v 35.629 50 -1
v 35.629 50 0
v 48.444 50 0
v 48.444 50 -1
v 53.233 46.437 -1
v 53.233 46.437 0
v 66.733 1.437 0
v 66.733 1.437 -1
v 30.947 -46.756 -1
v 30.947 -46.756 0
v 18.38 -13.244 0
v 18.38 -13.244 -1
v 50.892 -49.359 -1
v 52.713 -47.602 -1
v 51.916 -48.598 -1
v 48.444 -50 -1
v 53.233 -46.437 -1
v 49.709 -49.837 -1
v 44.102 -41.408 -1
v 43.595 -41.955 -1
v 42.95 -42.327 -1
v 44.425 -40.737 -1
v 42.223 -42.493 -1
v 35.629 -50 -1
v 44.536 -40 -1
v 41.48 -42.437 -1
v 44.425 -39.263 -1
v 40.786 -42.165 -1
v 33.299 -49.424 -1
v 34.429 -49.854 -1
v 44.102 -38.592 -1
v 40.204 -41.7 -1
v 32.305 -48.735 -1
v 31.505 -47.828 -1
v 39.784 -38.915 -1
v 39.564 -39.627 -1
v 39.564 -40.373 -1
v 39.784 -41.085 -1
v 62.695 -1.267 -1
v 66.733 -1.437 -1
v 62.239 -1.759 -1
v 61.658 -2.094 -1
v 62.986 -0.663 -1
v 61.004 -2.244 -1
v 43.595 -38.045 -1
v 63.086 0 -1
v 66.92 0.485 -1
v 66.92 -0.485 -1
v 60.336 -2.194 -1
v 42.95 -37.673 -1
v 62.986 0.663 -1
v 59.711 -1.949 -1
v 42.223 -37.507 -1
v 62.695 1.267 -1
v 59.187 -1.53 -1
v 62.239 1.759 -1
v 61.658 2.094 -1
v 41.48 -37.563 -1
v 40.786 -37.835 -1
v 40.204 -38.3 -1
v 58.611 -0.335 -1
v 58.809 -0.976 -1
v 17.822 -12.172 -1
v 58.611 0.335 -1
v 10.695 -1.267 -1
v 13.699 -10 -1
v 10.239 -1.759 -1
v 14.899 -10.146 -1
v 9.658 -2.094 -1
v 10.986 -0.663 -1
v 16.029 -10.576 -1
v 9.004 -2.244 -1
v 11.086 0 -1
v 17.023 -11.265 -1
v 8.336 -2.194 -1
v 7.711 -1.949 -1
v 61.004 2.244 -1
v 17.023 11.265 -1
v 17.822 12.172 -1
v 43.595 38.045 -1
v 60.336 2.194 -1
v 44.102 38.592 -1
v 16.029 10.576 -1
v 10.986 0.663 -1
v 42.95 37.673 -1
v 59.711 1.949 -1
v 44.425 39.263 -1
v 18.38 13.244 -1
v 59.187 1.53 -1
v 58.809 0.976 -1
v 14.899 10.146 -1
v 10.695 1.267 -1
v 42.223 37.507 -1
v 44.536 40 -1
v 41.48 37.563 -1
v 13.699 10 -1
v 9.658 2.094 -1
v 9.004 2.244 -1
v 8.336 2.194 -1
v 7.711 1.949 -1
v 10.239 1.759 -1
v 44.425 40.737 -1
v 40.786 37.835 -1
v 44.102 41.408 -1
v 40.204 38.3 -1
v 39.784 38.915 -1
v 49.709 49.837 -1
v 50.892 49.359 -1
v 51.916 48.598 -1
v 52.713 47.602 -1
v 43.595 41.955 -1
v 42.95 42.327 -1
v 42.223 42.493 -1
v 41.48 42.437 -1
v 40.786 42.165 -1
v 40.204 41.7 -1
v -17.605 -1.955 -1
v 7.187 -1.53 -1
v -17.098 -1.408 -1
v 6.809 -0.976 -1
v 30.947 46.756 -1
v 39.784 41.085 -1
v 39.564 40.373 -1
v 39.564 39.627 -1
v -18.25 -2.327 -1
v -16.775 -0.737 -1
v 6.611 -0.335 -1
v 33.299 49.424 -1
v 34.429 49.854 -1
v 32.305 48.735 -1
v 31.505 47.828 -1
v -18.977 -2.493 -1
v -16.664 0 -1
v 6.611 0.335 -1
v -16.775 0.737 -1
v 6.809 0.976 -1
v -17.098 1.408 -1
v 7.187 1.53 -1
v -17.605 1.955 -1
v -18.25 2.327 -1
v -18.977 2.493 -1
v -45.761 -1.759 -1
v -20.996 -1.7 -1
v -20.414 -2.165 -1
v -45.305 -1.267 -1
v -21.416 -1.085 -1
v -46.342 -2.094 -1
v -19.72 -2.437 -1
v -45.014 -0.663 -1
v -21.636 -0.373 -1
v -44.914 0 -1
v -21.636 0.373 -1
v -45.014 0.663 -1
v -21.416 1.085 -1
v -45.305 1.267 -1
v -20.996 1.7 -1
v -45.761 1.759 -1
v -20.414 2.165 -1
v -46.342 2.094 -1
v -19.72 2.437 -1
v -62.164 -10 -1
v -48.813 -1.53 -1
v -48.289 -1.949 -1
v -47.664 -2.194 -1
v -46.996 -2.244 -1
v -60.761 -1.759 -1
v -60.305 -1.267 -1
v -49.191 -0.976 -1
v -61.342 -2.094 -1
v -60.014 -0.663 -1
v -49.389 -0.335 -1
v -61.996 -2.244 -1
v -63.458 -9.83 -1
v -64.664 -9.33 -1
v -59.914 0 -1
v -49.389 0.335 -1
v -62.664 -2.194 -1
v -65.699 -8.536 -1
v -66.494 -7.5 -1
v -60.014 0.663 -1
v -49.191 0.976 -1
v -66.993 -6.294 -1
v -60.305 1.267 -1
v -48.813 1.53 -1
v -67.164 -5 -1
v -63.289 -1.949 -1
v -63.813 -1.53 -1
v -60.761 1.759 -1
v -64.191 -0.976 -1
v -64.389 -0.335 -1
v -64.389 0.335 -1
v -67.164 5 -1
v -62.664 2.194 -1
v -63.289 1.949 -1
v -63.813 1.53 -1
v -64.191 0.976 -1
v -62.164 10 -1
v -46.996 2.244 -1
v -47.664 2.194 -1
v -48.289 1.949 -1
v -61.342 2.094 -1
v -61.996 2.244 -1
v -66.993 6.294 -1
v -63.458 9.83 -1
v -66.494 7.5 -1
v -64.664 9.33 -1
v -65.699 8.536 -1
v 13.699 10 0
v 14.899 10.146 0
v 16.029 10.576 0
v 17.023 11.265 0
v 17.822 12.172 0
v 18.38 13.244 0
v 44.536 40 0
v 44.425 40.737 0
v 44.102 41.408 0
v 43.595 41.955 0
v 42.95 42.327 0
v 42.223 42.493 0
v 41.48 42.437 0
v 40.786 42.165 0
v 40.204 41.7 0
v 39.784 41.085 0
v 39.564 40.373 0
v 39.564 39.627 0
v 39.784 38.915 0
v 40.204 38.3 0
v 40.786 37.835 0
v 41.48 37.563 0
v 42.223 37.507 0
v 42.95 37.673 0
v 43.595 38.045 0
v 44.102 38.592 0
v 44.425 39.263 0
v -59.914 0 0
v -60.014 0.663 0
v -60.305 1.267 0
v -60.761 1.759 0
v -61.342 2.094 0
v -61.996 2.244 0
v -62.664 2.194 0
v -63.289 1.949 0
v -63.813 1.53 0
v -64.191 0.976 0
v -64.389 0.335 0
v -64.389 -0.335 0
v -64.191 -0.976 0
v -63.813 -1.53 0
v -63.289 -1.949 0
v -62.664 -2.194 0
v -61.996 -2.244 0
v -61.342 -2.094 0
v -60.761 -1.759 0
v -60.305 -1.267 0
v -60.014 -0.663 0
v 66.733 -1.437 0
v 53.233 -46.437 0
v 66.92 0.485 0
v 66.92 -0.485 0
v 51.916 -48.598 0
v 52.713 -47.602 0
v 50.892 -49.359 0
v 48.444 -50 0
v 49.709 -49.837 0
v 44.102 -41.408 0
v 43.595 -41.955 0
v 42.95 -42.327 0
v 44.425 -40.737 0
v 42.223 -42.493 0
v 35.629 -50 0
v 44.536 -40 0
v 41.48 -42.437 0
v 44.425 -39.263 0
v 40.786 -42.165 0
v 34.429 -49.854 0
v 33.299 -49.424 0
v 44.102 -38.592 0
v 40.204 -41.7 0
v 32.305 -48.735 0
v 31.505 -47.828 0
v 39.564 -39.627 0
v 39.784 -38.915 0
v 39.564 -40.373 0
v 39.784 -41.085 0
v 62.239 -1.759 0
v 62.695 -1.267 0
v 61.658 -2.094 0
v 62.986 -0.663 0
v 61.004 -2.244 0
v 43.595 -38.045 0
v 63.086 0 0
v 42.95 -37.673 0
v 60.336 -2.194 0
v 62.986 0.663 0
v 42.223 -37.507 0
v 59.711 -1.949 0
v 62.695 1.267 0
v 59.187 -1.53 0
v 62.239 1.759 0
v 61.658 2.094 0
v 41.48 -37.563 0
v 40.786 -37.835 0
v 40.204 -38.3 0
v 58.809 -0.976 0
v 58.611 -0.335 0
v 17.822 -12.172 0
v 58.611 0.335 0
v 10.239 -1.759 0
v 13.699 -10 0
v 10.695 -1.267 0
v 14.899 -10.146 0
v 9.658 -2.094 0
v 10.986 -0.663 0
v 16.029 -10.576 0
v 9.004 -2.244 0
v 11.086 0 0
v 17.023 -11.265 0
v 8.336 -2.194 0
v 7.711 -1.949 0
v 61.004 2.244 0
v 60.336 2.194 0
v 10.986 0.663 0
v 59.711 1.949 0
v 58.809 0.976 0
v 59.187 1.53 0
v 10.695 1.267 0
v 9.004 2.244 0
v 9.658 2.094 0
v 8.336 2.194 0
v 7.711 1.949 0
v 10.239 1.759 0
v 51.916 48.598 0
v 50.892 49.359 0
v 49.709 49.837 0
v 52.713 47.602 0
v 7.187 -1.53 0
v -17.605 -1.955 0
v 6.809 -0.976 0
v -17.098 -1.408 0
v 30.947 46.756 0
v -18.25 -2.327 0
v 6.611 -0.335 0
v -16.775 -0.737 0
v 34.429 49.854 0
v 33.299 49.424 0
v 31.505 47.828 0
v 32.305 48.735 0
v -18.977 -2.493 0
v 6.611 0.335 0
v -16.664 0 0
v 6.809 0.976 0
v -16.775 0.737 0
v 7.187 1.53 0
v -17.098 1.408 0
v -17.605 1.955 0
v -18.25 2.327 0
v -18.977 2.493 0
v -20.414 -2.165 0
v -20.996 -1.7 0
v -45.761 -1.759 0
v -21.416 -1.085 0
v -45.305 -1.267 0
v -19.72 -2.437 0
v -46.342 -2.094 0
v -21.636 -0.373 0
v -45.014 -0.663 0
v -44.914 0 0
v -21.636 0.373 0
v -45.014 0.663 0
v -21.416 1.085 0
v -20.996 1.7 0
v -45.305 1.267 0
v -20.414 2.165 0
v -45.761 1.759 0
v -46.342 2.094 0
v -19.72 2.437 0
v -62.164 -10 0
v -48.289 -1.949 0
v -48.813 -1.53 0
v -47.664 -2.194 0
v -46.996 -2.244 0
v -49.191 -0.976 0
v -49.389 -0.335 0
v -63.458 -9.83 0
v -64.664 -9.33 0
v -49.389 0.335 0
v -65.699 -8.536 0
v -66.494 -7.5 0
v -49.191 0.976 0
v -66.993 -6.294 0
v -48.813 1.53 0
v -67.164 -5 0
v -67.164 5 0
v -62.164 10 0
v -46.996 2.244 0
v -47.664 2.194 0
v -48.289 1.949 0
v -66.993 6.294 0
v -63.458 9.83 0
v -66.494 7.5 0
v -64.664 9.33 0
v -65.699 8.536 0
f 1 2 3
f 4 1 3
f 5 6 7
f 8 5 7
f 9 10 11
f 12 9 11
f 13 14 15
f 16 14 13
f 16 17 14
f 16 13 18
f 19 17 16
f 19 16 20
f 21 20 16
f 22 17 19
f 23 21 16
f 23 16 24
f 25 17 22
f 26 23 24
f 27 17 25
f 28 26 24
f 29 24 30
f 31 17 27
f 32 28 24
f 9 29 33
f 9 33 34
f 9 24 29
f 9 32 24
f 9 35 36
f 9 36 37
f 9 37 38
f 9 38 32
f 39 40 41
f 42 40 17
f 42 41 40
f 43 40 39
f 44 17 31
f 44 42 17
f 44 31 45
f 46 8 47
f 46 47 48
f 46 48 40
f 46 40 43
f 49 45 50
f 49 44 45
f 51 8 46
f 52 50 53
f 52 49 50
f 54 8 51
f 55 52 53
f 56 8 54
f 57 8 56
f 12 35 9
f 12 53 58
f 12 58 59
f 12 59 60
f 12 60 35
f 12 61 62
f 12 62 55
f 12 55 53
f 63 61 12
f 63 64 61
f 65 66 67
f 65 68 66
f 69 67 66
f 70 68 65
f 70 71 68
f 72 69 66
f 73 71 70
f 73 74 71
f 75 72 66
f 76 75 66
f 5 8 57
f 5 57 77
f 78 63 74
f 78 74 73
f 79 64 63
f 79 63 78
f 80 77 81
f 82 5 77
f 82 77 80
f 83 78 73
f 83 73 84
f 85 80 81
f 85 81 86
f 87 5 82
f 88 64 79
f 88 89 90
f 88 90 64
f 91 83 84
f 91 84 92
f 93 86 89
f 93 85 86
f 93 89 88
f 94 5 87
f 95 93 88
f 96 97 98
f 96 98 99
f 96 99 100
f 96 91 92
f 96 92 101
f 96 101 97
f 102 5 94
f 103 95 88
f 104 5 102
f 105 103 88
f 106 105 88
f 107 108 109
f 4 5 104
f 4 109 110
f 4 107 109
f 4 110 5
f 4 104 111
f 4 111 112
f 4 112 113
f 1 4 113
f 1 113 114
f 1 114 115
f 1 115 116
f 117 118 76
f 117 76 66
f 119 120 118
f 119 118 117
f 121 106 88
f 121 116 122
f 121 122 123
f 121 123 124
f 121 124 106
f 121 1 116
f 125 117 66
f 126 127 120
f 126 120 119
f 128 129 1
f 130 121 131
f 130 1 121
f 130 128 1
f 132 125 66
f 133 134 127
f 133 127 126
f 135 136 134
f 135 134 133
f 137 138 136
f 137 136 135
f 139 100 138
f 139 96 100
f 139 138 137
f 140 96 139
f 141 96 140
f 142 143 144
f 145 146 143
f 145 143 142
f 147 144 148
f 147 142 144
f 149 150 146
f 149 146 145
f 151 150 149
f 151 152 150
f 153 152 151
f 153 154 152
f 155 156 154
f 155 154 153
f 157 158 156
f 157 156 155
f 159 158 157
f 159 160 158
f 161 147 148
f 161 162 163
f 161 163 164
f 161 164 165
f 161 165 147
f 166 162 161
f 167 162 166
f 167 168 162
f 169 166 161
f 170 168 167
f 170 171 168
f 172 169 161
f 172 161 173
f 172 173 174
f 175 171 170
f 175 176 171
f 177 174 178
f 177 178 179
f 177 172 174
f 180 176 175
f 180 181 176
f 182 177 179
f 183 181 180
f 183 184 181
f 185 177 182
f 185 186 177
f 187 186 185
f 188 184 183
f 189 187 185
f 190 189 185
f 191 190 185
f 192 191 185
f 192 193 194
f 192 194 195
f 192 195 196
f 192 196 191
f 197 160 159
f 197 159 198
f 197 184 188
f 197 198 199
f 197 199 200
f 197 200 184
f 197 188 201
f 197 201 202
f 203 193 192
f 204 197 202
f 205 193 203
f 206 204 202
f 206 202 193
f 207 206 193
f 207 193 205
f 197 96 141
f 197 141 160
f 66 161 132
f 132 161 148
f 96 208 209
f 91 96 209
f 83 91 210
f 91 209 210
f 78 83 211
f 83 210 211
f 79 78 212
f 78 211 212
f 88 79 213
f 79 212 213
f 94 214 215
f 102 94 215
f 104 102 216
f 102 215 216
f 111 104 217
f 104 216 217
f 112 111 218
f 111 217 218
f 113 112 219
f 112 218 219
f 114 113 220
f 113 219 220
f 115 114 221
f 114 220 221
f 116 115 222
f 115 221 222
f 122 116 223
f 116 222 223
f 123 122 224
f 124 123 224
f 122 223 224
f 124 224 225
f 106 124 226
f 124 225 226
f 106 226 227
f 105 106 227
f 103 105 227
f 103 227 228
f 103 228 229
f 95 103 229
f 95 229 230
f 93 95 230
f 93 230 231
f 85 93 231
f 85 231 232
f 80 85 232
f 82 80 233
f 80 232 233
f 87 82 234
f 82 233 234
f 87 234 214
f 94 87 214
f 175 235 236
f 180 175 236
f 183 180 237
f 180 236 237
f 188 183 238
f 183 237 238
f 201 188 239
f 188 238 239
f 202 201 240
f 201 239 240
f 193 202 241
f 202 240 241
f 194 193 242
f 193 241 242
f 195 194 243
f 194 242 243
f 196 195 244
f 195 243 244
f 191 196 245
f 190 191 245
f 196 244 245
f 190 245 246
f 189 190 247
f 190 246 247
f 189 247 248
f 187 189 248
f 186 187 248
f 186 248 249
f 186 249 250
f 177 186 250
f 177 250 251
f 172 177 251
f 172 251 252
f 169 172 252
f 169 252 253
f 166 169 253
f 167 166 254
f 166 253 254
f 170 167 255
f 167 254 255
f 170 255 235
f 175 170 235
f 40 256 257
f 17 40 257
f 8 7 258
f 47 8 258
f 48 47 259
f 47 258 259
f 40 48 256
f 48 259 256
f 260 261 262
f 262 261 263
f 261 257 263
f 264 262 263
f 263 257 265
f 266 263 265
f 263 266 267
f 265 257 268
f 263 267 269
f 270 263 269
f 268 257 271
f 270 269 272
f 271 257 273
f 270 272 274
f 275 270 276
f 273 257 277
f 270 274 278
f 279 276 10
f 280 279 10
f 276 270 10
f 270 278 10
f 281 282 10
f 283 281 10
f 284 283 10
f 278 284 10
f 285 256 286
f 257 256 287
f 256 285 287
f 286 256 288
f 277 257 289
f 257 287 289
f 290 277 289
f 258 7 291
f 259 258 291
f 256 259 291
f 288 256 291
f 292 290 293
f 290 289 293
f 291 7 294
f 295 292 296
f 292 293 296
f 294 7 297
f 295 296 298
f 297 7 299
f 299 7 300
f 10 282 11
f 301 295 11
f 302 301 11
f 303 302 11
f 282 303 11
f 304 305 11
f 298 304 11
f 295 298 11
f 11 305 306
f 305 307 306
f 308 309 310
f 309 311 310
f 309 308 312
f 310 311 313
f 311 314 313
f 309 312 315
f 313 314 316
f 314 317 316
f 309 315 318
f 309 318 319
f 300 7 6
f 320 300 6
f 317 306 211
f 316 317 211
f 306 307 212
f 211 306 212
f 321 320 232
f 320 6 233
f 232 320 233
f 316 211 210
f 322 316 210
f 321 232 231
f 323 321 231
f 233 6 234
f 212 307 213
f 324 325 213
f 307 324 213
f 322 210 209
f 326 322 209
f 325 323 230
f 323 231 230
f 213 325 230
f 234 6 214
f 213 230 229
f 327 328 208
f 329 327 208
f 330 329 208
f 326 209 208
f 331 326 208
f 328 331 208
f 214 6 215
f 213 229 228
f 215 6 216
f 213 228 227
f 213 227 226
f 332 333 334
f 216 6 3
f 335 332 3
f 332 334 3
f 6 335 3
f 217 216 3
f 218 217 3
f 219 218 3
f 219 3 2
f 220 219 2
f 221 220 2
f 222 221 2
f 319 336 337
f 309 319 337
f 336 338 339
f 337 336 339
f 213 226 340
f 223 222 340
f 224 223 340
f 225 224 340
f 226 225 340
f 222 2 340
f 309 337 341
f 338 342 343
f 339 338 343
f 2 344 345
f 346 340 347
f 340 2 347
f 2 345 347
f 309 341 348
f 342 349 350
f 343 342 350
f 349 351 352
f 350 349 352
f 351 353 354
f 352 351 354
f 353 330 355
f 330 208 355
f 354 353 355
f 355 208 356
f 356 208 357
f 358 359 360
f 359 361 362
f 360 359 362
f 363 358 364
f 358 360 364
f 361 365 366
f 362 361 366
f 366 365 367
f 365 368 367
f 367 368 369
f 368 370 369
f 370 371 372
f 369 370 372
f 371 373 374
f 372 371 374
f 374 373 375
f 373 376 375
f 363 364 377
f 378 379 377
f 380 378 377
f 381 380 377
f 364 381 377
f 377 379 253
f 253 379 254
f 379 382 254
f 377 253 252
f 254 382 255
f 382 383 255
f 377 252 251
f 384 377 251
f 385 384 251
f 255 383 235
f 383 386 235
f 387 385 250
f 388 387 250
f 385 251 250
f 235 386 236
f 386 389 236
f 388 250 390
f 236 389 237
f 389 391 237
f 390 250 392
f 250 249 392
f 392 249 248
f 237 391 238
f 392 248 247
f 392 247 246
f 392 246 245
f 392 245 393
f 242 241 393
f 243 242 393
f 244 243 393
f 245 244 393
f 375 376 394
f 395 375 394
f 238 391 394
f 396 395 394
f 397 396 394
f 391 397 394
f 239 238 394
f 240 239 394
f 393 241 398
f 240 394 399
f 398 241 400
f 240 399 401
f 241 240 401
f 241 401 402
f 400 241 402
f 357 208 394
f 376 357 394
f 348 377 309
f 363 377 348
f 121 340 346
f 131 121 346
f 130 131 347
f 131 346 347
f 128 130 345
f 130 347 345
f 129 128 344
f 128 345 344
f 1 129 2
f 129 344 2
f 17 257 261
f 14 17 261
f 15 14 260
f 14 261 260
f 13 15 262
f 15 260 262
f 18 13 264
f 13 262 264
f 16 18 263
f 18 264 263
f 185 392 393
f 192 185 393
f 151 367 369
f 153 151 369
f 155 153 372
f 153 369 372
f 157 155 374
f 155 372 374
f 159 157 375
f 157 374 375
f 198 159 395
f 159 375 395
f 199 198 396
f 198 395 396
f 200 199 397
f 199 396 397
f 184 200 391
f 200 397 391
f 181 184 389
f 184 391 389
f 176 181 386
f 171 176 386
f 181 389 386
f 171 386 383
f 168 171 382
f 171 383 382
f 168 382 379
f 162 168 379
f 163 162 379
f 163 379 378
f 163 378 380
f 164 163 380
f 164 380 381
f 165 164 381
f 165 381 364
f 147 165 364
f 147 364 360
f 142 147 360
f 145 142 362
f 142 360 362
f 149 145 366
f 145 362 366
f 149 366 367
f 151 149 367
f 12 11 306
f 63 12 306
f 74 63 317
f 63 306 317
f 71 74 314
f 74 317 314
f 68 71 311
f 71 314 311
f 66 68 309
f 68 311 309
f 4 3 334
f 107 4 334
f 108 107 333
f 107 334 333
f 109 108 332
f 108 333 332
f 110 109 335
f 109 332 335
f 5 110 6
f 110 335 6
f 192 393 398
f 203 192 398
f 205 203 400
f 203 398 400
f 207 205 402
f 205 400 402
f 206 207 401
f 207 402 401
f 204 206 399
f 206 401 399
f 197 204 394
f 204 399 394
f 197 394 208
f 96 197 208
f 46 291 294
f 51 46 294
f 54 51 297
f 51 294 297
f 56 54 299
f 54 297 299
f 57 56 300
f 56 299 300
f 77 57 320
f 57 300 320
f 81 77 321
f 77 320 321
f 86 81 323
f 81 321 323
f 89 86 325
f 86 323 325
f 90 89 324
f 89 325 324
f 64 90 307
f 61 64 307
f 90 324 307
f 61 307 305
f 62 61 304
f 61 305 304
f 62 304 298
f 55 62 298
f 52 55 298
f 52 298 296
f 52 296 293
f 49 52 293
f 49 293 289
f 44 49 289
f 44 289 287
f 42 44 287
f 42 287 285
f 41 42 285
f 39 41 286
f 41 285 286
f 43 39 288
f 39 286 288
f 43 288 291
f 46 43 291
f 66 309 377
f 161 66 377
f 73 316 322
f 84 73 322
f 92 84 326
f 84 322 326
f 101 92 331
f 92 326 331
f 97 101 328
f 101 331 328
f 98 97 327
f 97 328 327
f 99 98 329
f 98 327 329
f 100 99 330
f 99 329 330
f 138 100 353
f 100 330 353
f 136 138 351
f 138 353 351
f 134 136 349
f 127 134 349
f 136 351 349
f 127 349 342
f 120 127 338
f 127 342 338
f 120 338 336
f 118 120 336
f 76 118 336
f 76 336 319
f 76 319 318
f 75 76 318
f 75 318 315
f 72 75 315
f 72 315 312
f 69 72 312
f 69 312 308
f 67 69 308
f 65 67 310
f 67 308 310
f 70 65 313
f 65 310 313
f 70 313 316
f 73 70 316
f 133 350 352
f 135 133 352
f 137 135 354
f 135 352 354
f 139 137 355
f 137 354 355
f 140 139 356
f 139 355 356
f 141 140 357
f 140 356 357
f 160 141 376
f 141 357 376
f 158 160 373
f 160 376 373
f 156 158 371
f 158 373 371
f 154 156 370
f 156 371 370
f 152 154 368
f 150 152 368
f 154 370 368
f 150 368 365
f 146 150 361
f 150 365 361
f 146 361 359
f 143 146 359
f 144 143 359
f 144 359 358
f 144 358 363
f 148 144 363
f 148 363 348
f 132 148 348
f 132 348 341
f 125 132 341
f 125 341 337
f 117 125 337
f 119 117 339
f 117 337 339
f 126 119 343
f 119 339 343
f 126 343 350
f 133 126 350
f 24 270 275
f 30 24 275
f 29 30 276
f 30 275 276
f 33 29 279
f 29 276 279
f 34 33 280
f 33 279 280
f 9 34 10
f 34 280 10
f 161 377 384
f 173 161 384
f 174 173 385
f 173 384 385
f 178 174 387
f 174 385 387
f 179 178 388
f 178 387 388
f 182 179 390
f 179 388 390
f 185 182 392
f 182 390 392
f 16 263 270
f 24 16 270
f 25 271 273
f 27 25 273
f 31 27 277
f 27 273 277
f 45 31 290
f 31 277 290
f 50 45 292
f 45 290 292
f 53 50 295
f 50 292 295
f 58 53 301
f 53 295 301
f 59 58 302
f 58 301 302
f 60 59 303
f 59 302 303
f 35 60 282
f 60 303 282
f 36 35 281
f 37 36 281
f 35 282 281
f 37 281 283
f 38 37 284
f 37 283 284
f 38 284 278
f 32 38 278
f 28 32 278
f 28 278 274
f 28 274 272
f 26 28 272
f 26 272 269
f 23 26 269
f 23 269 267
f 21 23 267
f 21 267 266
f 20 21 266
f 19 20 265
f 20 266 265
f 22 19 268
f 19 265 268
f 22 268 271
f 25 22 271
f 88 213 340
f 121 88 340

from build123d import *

# Parameters (mm, degrees)
SKETCH2_R          = 2.5
SKETCH2_R_2        = 2.25
BASE_FLANGE1_DEPTH = 1


# Sheet-metal steps are written as plain solids
with BuildPart() as part:
    # Sketch2 → Base-Flange1 (new body)
    with BuildSketch(Plane.XY):
        with BuildLine():
            Line((-62.163787728, 10), (13.698785388, 10))
            ThreePointArc((13.698785388, 10), (16.546759576, 10.890371912), (18.380431275, 13.244382792))
            Line((18.380431275, 13.244382792), (30.947144181, 46.755617208))
            ThreePointArc((30.947144181, 46.755617208), (32.78081588, 49.109628088), (35.628790069, 50))
            Line((35.628790069, 50), (48.443634474, 50))
            ThreePointArc((48.443634474, 50), (51.428287122, 49.011464641), (53.2327659, 46.436739428))
            Line((53.2327659, 46.436739428), (66.7327659, 1.436739428))
            ThreePointArc((66.7327659, 1.436739428), (66.943634474, 0), (66.7327659, -1.436739428))
            Line((66.7327659, -1.436739428), (53.2327659, -46.436739428))
            ThreePointArc((53.2327659, -46.436739428), (51.428287122, -49.011464641), (48.443634474, -50))
            Line((48.443634474, -50), (35.628790069, -50))
            ThreePointArc((35.628790069, -50), (32.78081588, -49.109628088), (30.947144181, -46.755617208))
            Line((30.947144181, -46.755617208), (18.380431275, -13.244382792))
            ThreePointArc((18.380431275, -13.244382792), (16.546759576, -10.890371912), (13.698785388, -10))
            Line((13.698785388, -10), (-62.163787728, -10))
            ThreePointArc((-62.163787728, -10), (-65.699321634, -8.535533906), (-67.163787728, -5))
            Line((-67.163787728, -5), (-67.163787728, 5))
            ThreePointArc((-67.163787728, 5), (-65.699321634, 8.535533906), (-62.163787728, 10))
        make_face()
        with Locations((-19.163787728, 0)):
            Circle(SKETCH2_R, mode=Mode.SUBTRACT)
        with Locations((42.036212272, 40)):
            Circle(SKETCH2_R, mode=Mode.SUBTRACT)
        with Locations((42.036212272, -40)):
            Circle(SKETCH2_R, mode=Mode.SUBTRACT)
        with Locations((-62.163787728, 0)):
            Circle(SKETCH2_R_2, mode=Mode.SUBTRACT)
        with Locations((-47.163787728, 0)):
            Circle(SKETCH2_R_2, mode=Mode.SUBTRACT)
        with Locations((8.836212272, 0)):
            Circle(SKETCH2_R_2, mode=Mode.SUBTRACT)
        with Locations((60.836212272, 0)):
            Circle(SKETCH2_R_2, mode=Mode.SUBTRACT)
    extrude(amount=-BASE_FLANGE1_DEPTH)


solid = part.part
